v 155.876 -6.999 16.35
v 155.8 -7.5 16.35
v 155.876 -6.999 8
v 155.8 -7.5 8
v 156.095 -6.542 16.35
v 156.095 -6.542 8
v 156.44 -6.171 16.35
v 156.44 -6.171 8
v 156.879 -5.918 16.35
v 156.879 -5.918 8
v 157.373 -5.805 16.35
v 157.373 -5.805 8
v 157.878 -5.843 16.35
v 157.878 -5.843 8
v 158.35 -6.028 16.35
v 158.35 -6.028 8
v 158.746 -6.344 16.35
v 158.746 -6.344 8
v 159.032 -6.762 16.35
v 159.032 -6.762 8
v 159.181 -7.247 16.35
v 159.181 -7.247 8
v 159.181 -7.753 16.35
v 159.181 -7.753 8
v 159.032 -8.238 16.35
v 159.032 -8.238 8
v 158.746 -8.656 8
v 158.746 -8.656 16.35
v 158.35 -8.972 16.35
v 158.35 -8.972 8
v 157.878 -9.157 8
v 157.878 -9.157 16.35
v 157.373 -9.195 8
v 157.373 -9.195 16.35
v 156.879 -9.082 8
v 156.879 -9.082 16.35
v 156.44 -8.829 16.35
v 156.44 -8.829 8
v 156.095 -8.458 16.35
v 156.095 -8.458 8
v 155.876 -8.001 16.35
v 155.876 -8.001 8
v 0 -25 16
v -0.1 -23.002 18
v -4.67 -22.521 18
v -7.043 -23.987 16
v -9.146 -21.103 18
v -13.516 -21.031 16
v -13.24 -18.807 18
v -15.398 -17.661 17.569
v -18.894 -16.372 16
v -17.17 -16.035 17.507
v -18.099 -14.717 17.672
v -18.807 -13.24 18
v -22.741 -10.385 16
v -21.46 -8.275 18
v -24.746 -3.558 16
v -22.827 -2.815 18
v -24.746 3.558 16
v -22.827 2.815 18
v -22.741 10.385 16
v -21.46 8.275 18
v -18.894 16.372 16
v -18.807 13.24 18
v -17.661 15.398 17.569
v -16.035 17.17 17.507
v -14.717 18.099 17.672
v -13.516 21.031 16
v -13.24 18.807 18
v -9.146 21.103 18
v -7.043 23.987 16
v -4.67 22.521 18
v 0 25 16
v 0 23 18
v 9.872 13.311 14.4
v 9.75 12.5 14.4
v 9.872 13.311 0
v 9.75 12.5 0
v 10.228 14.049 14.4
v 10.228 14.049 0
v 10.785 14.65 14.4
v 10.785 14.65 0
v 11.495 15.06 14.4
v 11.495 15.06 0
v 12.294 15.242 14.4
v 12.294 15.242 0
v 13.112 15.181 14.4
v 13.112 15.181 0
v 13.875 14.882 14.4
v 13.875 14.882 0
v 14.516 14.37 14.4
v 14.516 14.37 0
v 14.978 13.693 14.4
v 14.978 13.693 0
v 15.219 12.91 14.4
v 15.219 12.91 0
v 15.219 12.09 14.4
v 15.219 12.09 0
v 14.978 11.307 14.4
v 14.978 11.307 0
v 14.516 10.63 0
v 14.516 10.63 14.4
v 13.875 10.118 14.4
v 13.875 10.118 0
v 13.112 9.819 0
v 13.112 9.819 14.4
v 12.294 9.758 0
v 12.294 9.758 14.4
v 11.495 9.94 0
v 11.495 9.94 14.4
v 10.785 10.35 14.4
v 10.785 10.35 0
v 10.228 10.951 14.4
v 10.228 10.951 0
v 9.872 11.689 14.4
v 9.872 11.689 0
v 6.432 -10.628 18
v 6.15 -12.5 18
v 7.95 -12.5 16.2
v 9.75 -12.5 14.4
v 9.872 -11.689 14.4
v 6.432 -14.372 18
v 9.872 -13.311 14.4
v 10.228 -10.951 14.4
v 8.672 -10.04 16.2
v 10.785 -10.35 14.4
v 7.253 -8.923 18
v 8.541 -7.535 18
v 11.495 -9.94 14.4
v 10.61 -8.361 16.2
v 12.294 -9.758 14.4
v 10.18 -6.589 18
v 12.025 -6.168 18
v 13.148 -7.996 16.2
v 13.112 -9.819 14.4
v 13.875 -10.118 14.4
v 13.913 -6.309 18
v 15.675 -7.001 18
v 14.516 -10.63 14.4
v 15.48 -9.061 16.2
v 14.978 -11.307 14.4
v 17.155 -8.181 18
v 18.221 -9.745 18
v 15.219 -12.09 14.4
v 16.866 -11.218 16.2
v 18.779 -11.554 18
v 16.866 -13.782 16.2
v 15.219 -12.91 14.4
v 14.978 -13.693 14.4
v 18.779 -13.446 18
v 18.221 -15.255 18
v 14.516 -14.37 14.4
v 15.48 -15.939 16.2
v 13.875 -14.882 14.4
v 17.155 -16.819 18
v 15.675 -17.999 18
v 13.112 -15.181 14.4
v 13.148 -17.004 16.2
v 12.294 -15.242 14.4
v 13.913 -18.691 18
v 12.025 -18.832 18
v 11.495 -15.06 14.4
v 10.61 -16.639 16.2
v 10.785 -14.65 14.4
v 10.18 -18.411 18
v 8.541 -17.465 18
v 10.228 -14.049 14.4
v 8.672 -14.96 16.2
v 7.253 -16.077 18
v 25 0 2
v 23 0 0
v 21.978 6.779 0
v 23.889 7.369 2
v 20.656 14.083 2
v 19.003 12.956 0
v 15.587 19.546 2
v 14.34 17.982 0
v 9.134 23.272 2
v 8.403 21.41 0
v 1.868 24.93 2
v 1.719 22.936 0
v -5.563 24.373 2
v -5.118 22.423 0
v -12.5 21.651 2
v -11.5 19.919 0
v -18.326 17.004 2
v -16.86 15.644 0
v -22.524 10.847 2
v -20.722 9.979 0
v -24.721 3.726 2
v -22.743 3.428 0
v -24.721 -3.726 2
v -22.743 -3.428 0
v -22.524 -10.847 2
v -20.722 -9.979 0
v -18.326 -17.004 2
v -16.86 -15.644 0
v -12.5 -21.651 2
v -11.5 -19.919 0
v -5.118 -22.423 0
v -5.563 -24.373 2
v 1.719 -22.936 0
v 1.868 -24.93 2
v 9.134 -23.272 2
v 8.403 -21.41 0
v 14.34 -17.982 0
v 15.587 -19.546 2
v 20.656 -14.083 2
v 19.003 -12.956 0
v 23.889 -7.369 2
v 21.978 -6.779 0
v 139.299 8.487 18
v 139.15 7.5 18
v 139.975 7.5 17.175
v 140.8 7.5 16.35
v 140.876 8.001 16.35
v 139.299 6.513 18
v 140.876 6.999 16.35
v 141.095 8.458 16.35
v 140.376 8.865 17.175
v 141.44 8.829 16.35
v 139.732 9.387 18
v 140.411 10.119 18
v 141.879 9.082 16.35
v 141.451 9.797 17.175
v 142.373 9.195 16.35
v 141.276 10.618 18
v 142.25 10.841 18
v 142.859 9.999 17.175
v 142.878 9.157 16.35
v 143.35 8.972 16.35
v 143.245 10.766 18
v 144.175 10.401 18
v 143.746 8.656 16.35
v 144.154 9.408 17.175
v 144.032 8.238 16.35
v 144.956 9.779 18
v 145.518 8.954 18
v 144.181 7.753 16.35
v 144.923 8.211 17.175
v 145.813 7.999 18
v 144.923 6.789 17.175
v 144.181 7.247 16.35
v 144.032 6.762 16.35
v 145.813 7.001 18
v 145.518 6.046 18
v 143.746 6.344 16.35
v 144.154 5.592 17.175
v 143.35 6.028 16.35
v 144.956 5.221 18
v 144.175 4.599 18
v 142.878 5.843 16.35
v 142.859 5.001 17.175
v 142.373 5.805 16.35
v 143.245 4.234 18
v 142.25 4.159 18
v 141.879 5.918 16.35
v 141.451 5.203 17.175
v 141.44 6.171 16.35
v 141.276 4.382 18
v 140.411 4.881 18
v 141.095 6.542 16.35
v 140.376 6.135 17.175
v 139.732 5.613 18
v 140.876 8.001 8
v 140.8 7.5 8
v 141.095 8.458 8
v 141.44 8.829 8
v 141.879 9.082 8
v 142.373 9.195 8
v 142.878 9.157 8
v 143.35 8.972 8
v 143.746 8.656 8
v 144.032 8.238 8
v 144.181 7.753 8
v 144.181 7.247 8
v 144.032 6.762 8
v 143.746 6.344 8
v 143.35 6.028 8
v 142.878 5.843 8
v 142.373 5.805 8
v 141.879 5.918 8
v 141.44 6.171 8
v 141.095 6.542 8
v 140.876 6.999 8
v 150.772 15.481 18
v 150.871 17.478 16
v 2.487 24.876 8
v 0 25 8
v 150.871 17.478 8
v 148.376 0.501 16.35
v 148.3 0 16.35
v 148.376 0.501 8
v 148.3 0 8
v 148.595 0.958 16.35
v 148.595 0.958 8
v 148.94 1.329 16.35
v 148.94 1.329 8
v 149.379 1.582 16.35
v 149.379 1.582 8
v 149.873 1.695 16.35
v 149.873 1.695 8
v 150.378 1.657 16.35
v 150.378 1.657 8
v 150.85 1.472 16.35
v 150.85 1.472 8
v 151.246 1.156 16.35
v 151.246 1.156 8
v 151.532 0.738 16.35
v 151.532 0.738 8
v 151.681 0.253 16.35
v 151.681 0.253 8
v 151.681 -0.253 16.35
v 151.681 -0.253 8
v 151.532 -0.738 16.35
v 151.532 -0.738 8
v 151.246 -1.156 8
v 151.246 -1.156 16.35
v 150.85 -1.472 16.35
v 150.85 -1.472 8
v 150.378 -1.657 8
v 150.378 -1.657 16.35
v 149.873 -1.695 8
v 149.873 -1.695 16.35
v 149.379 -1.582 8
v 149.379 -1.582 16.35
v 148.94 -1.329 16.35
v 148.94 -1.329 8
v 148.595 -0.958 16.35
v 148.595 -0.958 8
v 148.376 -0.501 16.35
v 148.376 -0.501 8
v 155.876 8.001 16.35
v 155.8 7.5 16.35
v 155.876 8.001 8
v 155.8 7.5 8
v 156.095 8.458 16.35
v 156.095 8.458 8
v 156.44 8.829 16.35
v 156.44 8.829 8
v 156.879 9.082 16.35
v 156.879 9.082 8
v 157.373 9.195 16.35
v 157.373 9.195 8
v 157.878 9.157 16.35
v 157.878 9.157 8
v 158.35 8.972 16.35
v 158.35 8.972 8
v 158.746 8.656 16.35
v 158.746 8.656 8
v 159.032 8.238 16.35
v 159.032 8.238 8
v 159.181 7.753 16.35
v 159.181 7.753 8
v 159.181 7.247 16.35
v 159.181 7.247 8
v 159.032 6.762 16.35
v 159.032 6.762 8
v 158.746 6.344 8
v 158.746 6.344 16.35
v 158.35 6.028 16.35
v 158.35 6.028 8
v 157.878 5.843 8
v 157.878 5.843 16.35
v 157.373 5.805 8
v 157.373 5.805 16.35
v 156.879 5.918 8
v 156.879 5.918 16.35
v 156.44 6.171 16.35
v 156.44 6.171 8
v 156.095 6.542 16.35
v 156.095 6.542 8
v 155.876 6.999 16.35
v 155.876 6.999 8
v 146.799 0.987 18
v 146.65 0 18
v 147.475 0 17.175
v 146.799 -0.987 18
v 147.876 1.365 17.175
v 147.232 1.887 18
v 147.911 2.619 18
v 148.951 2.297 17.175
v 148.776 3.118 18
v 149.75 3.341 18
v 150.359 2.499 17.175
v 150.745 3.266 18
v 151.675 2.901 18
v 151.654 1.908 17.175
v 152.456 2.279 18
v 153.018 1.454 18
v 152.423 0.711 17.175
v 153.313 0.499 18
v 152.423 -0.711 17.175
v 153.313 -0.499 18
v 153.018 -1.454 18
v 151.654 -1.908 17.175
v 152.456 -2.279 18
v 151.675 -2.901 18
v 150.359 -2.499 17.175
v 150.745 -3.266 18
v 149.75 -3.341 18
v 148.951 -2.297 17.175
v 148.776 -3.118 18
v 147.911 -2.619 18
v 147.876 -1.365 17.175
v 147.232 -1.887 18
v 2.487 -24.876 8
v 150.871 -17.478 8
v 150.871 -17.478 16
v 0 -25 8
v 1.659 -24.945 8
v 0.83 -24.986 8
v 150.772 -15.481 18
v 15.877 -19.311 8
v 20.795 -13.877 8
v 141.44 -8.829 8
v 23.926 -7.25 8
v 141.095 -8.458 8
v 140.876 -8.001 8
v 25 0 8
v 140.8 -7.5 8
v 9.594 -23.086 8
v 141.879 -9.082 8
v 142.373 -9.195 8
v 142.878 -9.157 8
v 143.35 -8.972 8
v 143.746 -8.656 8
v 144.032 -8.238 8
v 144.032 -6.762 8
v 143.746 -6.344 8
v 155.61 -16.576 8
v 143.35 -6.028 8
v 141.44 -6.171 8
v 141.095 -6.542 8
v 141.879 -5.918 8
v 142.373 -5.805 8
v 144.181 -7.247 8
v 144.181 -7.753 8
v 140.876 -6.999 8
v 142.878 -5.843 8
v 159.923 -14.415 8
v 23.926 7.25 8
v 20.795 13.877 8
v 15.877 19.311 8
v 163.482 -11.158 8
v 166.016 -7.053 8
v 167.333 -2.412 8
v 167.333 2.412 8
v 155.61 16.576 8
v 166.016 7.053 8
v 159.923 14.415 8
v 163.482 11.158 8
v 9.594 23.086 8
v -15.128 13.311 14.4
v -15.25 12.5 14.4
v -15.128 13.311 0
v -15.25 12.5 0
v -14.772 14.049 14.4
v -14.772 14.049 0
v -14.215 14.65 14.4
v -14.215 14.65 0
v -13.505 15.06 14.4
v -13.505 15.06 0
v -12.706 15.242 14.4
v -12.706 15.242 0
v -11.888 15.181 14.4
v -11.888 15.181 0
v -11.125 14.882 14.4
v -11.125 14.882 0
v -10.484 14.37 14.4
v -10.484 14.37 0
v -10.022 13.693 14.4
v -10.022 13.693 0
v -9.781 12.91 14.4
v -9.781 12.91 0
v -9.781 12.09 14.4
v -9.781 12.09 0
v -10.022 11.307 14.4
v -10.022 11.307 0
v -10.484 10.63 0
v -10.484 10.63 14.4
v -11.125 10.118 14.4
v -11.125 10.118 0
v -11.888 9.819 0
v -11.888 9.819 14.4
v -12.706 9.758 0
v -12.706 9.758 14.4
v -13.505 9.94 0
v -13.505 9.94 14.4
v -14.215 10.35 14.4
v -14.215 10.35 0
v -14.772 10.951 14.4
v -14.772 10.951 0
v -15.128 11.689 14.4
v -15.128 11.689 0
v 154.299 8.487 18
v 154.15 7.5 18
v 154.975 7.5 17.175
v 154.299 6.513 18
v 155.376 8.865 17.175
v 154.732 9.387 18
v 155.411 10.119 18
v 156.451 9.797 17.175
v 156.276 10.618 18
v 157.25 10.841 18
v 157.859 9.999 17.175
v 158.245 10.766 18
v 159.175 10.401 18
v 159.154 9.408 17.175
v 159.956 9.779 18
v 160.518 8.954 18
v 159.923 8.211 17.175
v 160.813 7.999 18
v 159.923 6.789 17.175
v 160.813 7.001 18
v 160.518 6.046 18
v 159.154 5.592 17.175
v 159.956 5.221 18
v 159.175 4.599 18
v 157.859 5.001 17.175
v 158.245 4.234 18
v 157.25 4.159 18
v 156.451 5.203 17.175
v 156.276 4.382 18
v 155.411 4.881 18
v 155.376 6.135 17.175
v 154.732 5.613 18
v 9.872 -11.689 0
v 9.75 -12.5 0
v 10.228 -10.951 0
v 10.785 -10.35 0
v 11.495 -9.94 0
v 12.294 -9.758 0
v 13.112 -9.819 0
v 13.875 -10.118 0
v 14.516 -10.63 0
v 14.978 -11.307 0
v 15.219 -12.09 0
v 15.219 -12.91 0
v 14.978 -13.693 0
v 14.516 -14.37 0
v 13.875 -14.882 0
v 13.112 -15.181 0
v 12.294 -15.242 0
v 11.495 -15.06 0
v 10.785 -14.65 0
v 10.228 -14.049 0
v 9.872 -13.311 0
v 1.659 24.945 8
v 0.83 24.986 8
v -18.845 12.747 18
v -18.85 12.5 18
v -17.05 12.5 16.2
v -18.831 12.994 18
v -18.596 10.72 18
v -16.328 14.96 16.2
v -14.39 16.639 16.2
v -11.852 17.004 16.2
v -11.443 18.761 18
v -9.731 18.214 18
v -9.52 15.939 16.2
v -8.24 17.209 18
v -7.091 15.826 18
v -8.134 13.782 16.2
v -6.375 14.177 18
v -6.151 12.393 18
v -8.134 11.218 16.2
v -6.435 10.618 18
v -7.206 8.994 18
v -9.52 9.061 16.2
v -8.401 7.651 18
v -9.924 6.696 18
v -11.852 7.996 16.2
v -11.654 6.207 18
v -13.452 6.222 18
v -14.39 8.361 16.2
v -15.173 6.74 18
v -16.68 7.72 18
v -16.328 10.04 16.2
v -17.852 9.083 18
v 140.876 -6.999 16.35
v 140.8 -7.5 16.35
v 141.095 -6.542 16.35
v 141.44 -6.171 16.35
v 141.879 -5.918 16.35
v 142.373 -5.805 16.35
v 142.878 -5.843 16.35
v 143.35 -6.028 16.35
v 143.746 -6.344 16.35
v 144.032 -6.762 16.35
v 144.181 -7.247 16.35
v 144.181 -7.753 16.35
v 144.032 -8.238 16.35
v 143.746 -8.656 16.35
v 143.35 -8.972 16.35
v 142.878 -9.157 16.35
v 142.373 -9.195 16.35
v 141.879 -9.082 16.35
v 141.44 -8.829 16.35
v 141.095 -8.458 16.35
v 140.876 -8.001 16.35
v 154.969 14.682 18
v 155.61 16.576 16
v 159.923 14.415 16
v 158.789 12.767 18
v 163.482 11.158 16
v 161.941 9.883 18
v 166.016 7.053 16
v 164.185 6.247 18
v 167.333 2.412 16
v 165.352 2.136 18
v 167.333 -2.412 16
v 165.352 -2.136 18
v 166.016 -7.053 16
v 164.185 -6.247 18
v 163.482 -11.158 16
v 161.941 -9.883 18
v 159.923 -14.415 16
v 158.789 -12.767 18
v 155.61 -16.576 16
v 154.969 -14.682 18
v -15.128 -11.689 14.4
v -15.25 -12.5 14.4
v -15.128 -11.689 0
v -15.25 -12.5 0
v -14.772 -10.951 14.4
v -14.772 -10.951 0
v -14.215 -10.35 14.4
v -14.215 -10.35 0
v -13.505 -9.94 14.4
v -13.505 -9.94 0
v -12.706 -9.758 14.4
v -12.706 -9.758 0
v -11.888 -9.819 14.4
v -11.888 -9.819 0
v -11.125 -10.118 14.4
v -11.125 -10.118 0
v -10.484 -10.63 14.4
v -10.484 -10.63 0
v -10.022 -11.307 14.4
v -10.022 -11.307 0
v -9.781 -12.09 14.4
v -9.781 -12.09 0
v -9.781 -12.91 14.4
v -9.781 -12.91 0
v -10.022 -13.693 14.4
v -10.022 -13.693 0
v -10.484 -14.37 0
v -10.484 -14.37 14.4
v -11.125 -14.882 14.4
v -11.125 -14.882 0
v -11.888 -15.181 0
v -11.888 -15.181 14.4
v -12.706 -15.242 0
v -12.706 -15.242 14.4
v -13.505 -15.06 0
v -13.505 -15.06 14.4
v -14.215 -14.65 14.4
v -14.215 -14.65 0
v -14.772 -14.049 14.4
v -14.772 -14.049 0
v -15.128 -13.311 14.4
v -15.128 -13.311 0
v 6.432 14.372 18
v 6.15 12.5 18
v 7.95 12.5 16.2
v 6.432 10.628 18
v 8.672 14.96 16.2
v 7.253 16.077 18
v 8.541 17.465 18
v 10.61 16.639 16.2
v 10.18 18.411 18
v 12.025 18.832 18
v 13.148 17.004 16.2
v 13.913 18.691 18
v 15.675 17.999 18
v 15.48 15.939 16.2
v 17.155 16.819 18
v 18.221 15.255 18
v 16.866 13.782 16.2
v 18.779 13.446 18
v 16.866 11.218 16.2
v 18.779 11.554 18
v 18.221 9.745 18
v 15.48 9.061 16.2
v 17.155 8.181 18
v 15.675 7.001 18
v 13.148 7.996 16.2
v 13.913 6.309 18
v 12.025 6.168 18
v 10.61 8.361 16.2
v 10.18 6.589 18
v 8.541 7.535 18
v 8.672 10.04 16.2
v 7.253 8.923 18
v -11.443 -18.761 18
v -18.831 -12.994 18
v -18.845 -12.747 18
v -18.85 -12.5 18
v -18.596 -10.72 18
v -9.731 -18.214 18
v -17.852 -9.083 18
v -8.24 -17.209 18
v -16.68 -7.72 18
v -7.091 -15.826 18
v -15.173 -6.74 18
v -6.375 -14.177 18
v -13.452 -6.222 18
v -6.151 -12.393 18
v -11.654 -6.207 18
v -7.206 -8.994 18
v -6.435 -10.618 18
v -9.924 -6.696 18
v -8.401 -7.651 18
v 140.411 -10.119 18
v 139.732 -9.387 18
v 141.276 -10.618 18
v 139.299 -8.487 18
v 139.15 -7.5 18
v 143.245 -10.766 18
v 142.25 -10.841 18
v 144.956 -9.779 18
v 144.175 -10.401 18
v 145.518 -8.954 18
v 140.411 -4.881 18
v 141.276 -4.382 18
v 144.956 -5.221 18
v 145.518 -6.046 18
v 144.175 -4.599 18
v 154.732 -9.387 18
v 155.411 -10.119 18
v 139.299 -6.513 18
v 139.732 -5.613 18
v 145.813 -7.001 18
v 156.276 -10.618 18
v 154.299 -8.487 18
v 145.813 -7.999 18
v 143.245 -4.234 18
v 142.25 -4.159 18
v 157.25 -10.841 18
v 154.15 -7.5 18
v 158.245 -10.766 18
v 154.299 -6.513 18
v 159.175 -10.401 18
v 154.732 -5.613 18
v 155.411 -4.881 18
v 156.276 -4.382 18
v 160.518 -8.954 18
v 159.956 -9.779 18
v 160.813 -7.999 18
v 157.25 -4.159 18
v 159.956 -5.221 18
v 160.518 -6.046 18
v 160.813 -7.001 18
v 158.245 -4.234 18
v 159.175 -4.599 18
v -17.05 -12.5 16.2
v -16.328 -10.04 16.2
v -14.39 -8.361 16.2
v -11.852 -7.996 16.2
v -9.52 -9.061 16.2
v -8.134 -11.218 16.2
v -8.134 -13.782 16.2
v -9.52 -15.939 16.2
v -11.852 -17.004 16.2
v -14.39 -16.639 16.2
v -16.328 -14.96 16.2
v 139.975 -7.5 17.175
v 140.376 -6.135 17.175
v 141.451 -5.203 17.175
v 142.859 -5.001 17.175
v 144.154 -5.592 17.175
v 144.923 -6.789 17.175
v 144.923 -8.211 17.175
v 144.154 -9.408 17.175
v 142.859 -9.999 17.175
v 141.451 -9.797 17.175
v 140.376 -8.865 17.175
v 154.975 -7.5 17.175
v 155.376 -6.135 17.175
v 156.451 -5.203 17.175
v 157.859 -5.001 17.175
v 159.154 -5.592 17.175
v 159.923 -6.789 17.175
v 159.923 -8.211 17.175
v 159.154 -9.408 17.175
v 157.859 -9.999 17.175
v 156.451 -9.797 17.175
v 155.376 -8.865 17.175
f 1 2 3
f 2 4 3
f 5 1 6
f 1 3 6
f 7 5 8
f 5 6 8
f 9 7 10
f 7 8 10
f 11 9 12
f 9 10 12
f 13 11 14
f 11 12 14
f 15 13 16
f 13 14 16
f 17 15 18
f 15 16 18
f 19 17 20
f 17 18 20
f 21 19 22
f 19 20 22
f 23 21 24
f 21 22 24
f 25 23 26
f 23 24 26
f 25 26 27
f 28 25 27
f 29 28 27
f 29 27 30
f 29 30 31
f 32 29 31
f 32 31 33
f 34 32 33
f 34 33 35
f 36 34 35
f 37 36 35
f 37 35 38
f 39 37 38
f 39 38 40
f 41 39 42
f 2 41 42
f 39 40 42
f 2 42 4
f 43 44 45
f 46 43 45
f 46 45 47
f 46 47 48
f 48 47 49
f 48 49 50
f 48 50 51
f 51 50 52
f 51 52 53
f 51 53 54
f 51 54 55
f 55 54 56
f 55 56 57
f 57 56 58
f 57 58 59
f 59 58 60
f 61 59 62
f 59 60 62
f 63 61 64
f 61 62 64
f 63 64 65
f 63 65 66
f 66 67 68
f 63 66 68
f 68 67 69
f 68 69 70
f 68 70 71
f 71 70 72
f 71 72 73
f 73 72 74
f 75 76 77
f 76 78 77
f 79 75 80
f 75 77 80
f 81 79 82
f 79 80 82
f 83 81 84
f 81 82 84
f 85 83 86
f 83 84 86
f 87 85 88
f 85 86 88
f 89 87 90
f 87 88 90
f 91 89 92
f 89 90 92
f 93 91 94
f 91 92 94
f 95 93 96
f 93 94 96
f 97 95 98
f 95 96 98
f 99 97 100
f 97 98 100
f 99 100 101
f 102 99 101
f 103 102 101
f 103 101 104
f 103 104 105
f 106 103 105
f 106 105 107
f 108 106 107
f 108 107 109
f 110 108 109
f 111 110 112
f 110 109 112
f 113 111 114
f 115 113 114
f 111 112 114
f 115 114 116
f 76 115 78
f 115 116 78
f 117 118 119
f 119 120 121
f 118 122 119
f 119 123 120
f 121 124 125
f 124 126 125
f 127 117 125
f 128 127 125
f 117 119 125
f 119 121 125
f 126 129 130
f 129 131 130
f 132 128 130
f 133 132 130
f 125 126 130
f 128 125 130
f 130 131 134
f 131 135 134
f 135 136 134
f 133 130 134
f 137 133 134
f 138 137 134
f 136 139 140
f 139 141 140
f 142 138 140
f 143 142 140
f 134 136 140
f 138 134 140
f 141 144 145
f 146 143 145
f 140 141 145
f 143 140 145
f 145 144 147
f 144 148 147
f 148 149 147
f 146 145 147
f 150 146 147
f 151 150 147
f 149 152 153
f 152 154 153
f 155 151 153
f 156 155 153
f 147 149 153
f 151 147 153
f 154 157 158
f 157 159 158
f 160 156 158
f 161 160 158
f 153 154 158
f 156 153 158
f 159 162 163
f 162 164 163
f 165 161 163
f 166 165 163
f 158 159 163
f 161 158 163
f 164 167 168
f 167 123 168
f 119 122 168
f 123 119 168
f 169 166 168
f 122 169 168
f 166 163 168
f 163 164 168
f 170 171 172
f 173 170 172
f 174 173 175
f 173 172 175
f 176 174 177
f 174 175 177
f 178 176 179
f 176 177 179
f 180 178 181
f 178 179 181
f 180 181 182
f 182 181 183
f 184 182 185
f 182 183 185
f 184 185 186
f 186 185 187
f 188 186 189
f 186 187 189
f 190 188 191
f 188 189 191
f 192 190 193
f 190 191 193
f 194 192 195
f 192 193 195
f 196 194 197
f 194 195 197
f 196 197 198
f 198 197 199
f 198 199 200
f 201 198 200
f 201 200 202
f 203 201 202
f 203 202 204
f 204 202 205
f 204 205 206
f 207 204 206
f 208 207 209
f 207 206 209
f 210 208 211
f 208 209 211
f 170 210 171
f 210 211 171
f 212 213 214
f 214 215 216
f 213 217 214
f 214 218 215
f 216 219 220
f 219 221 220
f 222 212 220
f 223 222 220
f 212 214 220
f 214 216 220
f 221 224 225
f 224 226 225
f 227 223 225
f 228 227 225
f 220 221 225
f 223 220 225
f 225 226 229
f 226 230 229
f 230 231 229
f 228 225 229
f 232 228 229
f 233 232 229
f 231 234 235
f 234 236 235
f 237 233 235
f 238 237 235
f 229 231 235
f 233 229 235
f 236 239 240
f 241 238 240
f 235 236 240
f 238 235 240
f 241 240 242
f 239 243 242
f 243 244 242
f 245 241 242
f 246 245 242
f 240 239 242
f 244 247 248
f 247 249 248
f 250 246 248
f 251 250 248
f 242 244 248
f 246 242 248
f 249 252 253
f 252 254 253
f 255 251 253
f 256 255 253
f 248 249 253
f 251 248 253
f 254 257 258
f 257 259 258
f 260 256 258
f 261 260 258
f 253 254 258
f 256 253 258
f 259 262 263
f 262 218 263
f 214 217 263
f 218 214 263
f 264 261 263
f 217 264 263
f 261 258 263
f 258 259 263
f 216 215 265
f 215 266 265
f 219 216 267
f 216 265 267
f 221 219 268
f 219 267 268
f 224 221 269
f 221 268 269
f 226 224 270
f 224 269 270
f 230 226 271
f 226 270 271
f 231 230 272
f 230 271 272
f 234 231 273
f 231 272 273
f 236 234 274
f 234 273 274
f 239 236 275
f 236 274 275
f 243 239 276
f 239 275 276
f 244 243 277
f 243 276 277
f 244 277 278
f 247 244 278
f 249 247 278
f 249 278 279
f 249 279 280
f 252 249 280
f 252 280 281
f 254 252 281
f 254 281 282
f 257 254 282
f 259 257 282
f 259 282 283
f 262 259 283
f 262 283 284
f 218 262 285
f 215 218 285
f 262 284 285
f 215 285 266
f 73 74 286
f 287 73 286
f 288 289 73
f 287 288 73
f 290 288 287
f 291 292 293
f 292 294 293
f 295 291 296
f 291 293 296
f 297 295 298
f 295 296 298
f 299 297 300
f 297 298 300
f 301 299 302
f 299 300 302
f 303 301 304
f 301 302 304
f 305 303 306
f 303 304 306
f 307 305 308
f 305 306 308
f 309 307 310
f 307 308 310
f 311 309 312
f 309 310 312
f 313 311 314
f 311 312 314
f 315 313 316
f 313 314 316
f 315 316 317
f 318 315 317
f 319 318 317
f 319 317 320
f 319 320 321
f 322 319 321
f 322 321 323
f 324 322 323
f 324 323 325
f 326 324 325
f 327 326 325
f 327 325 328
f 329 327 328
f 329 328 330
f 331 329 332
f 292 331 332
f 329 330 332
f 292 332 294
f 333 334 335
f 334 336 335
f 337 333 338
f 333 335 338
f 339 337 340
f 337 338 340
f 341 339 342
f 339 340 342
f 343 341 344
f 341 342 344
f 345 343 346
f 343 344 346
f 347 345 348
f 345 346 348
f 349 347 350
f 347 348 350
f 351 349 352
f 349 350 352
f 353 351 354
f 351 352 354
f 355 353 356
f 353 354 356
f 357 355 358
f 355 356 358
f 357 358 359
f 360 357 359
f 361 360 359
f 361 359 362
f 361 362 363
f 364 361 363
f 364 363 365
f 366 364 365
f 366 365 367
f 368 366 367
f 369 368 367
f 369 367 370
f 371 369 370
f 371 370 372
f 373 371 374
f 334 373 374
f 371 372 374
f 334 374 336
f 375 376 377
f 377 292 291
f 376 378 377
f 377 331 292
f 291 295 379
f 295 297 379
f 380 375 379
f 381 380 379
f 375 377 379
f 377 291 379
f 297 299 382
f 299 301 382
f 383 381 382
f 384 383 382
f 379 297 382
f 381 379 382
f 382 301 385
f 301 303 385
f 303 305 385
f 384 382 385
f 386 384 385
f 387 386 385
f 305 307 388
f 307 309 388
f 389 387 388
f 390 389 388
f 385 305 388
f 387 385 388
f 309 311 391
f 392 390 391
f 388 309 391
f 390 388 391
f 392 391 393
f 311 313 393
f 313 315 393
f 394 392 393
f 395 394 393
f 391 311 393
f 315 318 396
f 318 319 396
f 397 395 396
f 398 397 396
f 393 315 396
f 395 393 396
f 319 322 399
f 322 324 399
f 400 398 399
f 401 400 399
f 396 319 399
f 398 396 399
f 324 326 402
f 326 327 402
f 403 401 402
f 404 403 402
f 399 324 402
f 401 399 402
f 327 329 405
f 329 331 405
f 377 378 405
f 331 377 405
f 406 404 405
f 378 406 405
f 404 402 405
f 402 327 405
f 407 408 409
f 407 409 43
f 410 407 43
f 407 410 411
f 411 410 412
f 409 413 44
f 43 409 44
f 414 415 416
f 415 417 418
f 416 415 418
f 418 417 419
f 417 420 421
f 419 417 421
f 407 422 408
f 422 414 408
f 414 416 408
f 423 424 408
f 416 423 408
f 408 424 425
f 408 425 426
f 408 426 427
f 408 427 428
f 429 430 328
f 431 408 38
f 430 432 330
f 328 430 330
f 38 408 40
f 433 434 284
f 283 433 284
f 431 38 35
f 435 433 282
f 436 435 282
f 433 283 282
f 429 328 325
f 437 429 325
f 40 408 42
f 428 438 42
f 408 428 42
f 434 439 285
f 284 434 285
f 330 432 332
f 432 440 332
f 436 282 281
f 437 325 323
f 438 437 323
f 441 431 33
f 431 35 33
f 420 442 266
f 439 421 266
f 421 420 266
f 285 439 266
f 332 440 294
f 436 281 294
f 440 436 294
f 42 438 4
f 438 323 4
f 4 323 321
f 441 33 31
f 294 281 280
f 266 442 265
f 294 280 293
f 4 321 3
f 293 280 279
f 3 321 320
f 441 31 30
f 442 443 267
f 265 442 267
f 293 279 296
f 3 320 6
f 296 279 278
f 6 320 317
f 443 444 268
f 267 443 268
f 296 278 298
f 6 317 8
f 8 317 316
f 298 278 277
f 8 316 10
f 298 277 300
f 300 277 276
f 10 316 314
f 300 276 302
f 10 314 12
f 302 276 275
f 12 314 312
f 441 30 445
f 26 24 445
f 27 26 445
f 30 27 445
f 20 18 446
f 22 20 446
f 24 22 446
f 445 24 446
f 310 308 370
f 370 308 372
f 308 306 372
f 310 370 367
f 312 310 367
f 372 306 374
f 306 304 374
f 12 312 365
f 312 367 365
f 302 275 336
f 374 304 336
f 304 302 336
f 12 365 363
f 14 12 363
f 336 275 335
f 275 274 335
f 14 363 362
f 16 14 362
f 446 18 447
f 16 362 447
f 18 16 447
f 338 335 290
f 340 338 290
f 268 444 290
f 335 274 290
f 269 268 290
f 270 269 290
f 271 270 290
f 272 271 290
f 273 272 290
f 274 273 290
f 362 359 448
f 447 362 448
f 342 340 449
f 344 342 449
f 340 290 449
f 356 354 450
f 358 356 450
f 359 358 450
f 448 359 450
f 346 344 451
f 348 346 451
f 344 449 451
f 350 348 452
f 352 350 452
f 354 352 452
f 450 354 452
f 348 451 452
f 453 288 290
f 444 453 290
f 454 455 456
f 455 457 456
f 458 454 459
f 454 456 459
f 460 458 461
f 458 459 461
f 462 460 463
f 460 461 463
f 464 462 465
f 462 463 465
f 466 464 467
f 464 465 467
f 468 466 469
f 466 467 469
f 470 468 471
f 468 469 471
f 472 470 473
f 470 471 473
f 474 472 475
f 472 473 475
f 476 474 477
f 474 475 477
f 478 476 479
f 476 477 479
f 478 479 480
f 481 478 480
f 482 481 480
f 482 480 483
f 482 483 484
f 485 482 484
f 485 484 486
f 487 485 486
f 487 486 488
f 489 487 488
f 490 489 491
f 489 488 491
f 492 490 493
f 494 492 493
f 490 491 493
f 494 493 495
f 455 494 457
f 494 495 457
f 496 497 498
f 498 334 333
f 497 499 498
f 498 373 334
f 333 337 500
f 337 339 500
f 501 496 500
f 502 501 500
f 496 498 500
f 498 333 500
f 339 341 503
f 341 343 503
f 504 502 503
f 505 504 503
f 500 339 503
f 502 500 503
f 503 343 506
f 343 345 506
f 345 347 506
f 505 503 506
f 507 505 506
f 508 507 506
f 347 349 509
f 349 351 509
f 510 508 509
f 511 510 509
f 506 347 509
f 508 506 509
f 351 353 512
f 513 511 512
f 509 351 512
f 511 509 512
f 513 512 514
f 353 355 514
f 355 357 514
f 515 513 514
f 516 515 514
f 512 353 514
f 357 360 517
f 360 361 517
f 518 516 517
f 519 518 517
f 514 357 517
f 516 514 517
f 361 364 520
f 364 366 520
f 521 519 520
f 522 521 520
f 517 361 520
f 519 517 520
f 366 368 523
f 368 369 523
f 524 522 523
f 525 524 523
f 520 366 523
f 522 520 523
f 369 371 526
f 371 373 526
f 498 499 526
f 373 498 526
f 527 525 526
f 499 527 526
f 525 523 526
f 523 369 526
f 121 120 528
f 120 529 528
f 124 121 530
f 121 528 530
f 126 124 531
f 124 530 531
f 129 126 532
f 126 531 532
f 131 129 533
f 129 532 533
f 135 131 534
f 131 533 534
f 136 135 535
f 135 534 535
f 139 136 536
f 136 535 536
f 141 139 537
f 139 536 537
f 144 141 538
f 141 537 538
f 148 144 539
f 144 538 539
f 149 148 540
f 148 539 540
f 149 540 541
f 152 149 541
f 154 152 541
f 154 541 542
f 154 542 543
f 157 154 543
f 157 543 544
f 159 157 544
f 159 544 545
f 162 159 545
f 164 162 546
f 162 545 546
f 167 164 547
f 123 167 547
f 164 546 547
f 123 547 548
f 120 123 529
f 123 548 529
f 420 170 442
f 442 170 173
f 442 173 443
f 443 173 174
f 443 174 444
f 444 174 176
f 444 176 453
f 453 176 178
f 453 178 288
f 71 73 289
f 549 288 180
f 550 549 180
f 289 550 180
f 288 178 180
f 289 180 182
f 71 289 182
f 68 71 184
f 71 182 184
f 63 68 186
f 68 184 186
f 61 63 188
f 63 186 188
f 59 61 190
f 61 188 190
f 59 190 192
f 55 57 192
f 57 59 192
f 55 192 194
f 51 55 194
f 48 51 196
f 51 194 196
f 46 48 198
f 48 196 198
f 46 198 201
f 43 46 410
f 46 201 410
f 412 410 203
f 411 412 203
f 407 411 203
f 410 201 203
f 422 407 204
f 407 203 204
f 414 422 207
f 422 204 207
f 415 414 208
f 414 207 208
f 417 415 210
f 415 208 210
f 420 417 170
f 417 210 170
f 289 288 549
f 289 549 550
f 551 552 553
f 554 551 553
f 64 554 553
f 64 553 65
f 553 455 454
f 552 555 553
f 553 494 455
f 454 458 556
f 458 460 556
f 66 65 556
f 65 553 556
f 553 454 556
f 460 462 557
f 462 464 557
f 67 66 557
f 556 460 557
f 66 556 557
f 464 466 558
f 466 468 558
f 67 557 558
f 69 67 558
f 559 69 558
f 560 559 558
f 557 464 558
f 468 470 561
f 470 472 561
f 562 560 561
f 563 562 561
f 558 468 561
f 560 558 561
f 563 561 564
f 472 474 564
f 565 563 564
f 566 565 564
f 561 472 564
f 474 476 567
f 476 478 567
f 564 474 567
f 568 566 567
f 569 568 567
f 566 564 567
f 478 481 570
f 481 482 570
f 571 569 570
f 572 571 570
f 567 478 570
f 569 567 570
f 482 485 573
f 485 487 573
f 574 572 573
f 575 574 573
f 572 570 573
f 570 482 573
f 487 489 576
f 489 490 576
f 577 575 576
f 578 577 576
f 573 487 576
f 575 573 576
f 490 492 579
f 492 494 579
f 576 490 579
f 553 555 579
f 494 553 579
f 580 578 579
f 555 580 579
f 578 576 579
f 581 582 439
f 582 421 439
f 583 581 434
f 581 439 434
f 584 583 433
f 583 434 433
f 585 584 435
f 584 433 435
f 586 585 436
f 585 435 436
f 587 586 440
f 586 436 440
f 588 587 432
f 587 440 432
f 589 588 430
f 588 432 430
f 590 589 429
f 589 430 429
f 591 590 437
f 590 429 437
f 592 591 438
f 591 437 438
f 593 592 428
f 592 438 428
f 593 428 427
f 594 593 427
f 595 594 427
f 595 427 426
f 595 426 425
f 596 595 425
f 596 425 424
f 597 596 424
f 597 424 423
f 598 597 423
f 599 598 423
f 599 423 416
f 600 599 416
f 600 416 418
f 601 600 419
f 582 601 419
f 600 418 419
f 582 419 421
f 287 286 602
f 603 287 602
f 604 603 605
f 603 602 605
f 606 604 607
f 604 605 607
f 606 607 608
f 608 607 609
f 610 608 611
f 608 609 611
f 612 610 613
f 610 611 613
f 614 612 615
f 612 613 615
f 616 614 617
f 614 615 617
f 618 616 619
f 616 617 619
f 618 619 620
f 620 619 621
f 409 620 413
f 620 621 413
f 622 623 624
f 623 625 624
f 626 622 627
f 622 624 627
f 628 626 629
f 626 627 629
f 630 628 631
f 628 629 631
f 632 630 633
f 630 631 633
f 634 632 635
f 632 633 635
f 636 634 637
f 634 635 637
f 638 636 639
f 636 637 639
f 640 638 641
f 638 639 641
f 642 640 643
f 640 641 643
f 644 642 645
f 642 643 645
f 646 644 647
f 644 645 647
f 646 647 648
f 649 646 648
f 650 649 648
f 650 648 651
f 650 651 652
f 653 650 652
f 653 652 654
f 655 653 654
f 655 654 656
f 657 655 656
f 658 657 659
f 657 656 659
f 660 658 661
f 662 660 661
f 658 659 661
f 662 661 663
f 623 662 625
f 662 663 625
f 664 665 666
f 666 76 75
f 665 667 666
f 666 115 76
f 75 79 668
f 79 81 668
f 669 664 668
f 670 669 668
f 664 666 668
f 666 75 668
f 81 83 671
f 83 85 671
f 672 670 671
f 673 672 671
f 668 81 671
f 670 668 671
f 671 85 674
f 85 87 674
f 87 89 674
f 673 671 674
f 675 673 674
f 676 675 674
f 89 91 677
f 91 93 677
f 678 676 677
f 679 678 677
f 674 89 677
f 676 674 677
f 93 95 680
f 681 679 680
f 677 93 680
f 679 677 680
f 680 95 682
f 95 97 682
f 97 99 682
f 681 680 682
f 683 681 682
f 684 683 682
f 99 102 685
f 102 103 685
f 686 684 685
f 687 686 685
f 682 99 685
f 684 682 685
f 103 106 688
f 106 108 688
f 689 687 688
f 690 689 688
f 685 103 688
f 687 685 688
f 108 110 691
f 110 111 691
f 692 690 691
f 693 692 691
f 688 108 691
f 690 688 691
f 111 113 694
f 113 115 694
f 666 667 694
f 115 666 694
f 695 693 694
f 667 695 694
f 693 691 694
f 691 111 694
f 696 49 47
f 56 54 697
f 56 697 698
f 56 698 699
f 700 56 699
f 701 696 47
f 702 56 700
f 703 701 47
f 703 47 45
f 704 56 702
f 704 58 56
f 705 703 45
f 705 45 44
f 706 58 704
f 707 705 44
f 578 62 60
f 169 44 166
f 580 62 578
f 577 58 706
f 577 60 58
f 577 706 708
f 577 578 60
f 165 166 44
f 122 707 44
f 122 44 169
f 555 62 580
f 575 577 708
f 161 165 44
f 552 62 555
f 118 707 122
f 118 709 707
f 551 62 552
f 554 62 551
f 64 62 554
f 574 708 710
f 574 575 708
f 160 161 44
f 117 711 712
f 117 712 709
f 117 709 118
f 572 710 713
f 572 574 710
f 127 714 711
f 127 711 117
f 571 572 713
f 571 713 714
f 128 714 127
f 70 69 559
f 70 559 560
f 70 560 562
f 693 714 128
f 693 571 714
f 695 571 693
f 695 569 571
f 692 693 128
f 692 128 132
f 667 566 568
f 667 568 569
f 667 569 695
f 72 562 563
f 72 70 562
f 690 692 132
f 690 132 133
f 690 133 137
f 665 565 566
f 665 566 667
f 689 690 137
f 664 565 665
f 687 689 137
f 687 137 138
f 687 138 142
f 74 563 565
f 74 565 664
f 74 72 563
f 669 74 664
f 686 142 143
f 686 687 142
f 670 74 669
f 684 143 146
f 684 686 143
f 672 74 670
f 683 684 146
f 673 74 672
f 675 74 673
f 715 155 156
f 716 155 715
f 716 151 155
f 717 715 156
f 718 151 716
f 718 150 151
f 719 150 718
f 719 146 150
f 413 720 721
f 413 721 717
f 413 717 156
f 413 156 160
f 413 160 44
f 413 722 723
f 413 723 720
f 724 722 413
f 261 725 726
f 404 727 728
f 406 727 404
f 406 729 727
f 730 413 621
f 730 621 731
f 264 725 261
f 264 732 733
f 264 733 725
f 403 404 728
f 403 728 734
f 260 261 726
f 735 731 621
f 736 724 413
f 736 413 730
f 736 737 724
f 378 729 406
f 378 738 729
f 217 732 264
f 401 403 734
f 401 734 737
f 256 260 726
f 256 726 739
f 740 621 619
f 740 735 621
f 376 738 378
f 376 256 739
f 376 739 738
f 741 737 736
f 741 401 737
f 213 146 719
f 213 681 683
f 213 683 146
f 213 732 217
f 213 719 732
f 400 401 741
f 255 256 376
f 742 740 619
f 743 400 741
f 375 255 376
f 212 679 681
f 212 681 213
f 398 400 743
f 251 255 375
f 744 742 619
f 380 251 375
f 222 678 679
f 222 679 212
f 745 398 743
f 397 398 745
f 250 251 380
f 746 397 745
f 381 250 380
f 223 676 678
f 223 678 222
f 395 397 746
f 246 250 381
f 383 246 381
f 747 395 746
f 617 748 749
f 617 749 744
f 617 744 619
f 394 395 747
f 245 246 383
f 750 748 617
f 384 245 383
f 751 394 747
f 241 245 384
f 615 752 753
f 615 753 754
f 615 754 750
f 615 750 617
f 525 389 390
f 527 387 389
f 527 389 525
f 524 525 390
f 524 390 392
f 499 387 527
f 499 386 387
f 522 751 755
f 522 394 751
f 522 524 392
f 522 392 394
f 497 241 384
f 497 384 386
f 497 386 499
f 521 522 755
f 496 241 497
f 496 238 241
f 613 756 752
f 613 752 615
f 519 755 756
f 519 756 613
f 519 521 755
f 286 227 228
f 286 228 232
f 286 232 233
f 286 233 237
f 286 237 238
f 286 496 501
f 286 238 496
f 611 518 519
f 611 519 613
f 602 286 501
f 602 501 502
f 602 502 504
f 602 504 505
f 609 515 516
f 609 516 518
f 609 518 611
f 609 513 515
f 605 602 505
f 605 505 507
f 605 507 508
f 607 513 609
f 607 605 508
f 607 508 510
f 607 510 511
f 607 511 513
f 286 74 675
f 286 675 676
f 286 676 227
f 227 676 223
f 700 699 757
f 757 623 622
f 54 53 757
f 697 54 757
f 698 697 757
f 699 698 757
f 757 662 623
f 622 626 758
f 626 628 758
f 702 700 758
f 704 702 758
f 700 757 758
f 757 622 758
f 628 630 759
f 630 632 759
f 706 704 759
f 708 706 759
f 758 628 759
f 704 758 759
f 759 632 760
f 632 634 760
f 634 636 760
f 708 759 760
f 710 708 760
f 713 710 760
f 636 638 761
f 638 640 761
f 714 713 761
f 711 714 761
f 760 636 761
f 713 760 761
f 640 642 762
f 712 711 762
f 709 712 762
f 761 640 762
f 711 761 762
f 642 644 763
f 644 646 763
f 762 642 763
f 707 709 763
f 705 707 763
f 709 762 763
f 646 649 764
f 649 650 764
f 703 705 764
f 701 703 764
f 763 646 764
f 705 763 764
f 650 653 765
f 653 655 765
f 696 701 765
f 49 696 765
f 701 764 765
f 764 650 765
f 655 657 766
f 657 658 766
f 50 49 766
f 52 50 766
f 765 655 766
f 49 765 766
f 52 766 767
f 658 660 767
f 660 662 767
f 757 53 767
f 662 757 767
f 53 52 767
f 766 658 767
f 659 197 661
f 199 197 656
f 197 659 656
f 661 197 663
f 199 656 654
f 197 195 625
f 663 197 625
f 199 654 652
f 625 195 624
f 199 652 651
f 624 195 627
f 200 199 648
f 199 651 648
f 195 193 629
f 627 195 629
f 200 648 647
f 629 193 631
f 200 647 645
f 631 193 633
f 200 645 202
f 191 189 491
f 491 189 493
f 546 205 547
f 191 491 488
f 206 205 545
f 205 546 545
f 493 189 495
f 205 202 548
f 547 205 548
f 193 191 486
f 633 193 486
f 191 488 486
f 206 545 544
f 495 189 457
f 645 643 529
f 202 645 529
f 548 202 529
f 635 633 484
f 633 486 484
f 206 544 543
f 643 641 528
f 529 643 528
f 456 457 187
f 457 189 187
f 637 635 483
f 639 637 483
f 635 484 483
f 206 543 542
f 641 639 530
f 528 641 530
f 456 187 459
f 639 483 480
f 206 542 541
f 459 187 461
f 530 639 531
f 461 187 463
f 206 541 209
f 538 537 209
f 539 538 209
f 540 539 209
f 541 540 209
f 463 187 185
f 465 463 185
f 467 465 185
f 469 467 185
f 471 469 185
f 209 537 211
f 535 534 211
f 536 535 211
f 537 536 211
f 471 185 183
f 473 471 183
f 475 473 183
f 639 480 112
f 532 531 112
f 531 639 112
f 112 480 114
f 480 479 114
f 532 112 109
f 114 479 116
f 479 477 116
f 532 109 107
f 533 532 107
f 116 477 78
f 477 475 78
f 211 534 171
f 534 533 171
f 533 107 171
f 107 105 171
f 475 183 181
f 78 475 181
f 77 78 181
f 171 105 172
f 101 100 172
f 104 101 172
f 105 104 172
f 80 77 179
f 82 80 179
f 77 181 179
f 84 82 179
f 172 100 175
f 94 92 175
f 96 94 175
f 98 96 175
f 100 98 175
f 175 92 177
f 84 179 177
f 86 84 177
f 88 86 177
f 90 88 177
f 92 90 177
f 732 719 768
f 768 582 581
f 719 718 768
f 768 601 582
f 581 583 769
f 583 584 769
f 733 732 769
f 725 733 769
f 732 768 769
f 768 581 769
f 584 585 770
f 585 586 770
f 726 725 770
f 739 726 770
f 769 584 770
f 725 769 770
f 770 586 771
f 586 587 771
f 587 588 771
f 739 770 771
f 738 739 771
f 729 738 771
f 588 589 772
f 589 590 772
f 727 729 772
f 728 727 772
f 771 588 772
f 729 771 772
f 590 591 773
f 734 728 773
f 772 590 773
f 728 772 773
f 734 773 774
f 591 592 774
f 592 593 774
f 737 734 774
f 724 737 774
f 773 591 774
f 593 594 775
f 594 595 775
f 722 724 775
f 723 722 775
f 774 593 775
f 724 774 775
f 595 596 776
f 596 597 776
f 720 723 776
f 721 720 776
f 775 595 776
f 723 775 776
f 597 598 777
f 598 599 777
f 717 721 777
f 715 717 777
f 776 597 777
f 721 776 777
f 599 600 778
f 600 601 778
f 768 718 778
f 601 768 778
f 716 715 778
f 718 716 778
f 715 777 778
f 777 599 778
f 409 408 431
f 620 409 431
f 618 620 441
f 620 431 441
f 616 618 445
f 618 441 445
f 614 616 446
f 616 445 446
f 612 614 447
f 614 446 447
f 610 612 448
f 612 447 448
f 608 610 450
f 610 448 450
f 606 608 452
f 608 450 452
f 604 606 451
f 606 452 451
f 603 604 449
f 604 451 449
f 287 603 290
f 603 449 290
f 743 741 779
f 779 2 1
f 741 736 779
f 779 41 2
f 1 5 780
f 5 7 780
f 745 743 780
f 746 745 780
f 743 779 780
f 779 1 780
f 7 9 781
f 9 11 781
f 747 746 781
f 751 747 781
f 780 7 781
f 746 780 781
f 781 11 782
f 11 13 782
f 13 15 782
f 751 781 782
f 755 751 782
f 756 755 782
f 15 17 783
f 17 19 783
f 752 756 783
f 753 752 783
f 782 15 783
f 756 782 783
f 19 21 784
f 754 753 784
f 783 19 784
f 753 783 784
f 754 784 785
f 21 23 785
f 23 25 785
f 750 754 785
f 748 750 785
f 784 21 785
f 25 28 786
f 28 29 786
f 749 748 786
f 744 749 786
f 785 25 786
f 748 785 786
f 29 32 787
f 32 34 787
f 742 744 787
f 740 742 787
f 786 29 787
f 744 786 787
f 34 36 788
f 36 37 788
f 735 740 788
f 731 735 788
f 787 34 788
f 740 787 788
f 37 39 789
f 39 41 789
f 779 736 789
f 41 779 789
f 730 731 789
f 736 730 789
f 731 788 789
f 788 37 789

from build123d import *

# Parameters (mm, degrees)
SKETCH_R            = 25
PAD_DEPTH           = 8
PAD001_DEPTH        = 10
CHAMFER_SIZE        = 2
HOLE_D              = 5.5
HOLE_DEPTH          = 25
HOLE_CSINK_D        = 12.7
HOLE_CSINK_ANGLE    = 90
HOLE001_D           = 3.4
HOLE001_DEPTH       = 25
HOLE001_CSINK_D     = 6.7
HOLE001_CSINK_ANGLE = 90
CHAMFER001_SIZE     = 2


with BuildPart() as part:
    # Sketch → Pad (new body)
    with BuildSketch(Plane.XY):
        Circle(SKETCH_R)
    extrude(amount=PAD_DEPTH)

    # Sketch001 (on Face3 of Pad) → Pad001 (join)
    with BuildSketch(Plane.XY.offset(8)):
        with BuildLine():
            ThreePointArc((0, 25), (-25, 0), (0, -25))
            Line((150.871382, -17.478292), (0, -25))
            ThreePointArc((150.871382, -17.478292), (167.5, 0), (150.871382, 17.478292))
            Line((0, 25), (150.871382, 17.478292))
        make_face()
    extrude(amount=PAD001_DEPTH)

    # Chamfer
    chamfer_edges = [part.edges().sort_by_distance(p)[0] for p in [
        (75.435691, -21.239146, 18),
    ]]
    chamfer(chamfer_edges, length=CHAMFER_SIZE)

    # Hole
    with Locations(Plane.XY.offset(18)):
        with Locations((-12.5, 12.5), (12.5, 12.5), (12.5, -12.5), (-12.5, -12.5)):
            CounterSinkHole(HOLE_D / 2, HOLE_CSINK_D / 2, depth=HOLE_DEPTH, counter_sink_angle=HOLE_CSINK_ANGLE)

    # Hole001
    with Locations(Plane.XY.offset(18)):
        with Locations((142.5, 7.5), (157.5, 7.5), (157.5, -7.5), (142.5, -7.5), (150, 0)):
            CounterSinkHole(HOLE001_D / 2, HOLE001_CSINK_D / 2, depth=HOLE001_DEPTH, counter_sink_angle=HOLE001_CSINK_ANGLE)

    # Chamfer001
    chamfer001_edges = [part.edges().sort_by_distance(p)[0] for p in [
        (-25, 0, 0),
    ]]
    chamfer(chamfer001_edges, length=CHAMFER001_SIZE)


solid = part.part
